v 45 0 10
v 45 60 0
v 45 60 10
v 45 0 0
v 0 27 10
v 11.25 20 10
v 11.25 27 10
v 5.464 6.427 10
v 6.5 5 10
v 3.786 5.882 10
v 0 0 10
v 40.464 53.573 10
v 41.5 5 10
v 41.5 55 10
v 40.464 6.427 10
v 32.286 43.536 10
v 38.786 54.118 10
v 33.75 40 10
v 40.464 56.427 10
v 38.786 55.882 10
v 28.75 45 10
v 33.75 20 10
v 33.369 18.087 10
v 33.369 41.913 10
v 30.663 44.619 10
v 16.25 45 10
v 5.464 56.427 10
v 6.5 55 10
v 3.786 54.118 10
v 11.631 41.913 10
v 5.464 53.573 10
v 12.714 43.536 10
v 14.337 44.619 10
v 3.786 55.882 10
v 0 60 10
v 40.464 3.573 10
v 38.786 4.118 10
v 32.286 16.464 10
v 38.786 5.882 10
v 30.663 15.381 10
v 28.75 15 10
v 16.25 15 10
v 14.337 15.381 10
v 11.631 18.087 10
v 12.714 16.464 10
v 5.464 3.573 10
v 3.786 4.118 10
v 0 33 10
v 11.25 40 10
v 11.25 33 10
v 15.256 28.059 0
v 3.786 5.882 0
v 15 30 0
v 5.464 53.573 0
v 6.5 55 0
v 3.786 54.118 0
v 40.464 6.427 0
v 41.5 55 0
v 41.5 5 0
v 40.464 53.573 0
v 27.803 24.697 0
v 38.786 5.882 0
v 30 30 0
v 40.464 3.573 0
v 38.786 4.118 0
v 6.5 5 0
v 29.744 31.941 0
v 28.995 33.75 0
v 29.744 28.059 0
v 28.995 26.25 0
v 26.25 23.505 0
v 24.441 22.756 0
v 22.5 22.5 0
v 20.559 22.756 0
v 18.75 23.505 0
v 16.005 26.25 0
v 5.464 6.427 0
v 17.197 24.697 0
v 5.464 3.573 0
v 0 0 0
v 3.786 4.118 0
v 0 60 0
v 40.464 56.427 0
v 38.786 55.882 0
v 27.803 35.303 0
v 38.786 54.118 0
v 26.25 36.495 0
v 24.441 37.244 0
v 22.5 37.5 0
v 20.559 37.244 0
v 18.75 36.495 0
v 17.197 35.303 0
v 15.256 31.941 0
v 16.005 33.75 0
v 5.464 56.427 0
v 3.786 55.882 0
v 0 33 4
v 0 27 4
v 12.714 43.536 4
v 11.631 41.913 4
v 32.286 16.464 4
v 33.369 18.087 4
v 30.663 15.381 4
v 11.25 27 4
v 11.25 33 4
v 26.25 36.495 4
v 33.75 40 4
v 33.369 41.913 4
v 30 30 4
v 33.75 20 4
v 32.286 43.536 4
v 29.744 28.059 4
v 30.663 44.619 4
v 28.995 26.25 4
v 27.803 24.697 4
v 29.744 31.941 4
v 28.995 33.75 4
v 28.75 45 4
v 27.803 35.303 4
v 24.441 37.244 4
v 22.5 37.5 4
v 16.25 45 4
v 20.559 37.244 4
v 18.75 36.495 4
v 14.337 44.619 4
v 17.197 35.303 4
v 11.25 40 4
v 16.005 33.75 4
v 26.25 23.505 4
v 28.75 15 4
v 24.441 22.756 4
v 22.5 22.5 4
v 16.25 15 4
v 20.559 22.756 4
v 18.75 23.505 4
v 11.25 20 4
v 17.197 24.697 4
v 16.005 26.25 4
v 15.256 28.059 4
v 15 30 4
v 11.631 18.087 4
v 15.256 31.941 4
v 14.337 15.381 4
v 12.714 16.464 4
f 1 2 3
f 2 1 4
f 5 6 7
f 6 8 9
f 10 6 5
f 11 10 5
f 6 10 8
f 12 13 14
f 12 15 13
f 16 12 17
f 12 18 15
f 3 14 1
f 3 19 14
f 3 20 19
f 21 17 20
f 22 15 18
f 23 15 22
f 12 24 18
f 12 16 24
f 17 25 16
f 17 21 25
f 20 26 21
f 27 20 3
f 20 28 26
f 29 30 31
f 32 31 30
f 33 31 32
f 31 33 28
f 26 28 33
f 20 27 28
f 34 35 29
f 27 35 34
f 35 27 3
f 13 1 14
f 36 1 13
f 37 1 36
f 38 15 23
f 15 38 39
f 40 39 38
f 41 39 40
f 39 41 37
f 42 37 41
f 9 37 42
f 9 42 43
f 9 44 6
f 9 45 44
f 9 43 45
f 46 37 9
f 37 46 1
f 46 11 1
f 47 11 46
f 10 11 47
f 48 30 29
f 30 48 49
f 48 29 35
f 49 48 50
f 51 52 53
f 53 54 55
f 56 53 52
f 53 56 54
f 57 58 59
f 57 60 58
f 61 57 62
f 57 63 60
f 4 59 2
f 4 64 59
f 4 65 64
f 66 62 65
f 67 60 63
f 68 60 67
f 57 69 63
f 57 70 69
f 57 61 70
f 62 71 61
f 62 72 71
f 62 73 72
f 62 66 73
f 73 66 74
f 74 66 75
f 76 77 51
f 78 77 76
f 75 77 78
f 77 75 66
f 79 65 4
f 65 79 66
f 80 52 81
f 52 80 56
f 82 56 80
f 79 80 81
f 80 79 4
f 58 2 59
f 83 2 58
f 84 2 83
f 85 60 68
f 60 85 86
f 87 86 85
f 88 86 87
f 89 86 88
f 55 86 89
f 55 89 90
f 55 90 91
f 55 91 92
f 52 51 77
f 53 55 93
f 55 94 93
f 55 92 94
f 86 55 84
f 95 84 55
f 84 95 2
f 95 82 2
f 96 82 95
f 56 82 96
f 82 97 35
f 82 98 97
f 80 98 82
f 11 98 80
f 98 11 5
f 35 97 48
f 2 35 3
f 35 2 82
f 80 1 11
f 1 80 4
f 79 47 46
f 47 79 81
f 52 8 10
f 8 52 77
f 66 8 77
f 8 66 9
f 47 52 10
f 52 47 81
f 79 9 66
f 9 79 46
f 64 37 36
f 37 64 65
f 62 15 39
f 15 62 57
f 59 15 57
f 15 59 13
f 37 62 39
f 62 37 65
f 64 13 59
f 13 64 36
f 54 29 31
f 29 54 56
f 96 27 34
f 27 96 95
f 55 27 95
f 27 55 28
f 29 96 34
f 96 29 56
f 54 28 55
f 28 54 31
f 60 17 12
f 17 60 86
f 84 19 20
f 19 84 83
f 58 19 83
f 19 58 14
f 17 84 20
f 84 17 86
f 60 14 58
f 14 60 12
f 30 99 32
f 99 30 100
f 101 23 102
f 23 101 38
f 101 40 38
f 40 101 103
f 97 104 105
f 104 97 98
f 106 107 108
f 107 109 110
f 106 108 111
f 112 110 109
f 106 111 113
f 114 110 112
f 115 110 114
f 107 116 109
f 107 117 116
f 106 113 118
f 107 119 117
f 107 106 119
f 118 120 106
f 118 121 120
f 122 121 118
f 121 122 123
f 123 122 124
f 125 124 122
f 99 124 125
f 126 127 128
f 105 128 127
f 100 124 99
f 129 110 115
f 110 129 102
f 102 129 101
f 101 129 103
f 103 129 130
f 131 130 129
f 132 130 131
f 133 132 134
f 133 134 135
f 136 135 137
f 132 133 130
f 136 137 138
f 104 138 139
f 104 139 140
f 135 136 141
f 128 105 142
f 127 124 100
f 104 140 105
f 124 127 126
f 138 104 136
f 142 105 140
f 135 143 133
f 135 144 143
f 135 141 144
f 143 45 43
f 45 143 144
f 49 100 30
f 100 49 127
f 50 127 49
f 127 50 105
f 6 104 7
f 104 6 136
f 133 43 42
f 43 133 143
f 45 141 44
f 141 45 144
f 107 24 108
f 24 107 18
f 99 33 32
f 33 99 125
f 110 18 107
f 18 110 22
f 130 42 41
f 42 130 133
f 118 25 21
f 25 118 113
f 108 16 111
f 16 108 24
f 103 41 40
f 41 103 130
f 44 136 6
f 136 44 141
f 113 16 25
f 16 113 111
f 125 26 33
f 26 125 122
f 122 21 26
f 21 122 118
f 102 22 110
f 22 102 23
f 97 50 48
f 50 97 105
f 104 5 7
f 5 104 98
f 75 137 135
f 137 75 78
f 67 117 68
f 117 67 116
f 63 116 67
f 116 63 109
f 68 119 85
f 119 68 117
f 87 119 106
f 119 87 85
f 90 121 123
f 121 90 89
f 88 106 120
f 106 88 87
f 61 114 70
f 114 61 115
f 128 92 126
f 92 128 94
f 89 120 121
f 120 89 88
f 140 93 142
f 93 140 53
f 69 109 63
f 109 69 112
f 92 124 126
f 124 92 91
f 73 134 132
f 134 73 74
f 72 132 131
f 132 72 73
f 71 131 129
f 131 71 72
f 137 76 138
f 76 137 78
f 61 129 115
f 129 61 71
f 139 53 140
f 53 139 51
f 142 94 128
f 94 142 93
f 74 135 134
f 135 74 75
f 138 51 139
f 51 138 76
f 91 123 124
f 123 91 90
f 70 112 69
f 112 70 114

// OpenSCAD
// OpenSCAD script for a milled plate with holes, a pocket, a slot, and a center through‐hole
// Plate dimensions: 45mm (X) x 60mm (Y) x 10mm (Z)
// All features are defined relative to the origin at (0,0,0)

// The model is built as a single part using successive difference() operations

difference() {
  // 1. Base plate: a rectangular prism from (0,0,0)
  cube([45, 60, 10]);
  
  // 2. Four corner through-holes (3mm diameter).
  // Each hole's center is 5mm from each edge.
  // Using cylinders that extend beyond the plate (height=20, centered at z=5) for a full cut.
  translate([5, 5, 5])
    cylinder(d=3, h=20, center=true);
    
  translate([40, 5, 5])
    cylinder(d=3, h=20, center=true);
    
  translate([5, 55, 5])
    cylinder(d=3, h=20, center=true);
    
  translate([40, 55, 5])
    cylinder(d=3, h=20, center=true);
  
  // 3. Rectangular pocket with rounded corners.
  // Pocket dimensions: 22.5mm (X) x 30mm (Y), with a corner radius of 5mm.
  // The pocket is cut 6mm deep from the top surface (i.e. from z=4 to z=10).
  // The pocket is centered on the plate.
  translate([22.5, 30, 4])
    linear_extrude(height=6)
      // Create a round-cornered shape by starting with a smaller centered square
      // and offsetting it outward by 5mm.
      offset(r=5)
        square([12.5, 20], center=true);
  
  // 4. Slot from the outside of the plate to the rectangular pocket.
  // The slot is 6mm wide (Y), 6mm deep (Z, from z=4 to z=10), and runs parallel to the X axis.
  // It is centered in the Y direction (centered at y=30).
  // Assuming the slot starts at the left edge (x=0) and extends to the left side of the pocket (x=11.25).
  translate([0, 27, 4])
    cube([11.25, 6, 6]);
  
  // 5. Through-hole in the center of the plate.
  // Hole diameter: 15mm. The hole passes completely through the plate.
  // Using a cylinder (height=20, centered at z=5) to ensure a complete cut.
  translate([22.5, 30, 5])
    cylinder(d=15, h=20, center=true);
}
